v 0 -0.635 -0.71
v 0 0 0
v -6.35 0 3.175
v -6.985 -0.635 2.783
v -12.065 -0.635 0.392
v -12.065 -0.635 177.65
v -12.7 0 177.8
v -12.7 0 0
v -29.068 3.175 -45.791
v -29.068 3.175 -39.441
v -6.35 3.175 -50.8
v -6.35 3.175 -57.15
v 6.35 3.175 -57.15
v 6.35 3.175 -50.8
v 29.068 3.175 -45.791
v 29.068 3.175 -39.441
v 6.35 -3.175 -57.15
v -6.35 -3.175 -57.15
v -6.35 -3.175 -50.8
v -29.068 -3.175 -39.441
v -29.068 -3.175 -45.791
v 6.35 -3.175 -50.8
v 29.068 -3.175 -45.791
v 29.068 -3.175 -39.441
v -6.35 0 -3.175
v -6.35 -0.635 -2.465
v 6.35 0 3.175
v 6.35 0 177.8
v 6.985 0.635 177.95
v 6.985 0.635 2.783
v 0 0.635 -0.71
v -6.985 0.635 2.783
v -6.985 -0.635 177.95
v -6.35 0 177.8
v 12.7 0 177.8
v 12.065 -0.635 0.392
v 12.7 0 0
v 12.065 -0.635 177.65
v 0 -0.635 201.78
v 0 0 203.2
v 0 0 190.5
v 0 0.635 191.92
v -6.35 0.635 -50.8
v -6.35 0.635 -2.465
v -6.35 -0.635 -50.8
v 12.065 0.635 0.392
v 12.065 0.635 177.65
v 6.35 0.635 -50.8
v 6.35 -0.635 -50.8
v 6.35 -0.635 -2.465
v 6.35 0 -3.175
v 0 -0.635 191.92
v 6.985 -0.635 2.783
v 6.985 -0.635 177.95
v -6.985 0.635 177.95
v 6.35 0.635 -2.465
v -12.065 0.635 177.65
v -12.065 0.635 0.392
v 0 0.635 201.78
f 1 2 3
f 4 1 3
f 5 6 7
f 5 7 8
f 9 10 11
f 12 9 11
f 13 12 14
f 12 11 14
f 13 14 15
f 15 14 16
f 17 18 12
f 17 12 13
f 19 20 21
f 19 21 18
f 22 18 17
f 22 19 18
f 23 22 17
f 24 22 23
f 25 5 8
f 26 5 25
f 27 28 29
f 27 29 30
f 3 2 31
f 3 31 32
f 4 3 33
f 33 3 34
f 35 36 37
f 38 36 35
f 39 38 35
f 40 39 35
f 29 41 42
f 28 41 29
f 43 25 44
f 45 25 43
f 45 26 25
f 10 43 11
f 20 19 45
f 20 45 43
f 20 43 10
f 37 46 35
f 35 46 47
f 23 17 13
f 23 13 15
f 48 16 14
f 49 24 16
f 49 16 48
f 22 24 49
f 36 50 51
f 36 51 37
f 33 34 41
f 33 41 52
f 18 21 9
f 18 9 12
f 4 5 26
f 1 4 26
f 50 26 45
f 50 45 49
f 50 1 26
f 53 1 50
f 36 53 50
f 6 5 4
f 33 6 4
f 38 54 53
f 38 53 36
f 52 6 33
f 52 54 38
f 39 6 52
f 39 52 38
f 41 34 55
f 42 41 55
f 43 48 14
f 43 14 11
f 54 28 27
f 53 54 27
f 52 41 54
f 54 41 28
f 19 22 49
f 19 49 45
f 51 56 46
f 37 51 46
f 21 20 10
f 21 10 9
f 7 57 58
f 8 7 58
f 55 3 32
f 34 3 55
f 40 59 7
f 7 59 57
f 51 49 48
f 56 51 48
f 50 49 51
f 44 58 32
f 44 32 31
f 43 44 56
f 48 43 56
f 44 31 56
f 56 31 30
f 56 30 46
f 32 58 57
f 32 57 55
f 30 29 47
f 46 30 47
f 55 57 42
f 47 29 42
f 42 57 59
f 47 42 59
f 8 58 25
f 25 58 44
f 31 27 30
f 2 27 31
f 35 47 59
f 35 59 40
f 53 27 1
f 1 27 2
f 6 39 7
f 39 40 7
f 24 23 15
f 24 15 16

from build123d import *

# Parameters (mm, degrees)
F1_DEPTH = 0.635
F2_SIZE  = 0.63499
F3_DEPTH = 3.175
F4_SIZE  = 0.63499


# Not quite as in the source:
# - a fillet or chamfer is up to 0.001 mm smaller than in the source, because OpenCascade refuses the exact size


with BuildPart() as f1:
    # F0 (on Front) → F1 (new body, symmetric)
    with BuildSketch(Plane.XZ):
        Polygon((12.7, 177.8), (0, 203.2), (-12.7, 177.8), (-12.7, 0), (-6.35, -3.175), (-6.35, -50.8), (0, -50.8), (6.35, -50.8), (6.35, -3.175), (12.7, 0), align=None)
        Polygon((-6.35, 177.8), (0, 190.5), (6.35, 177.8), (6.35, 3.175), (0, 0), (-6.35, 3.175), align=None, mode=Mode.SUBTRACT)
    extrude(amount=F1_DEPTH, both=True)

    # F2 (size 0.635 in the source; OpenCascade refuses exactly that, so slightly less here)
    f2_edges = [f1.edges().sort_by_distance(p)[0] for p in [
        (12.7, -0.635, 88.9),
        (6.35, -0.635, 190.5),
        (-6.35, -0.635, 190.5),
        (-12.7, -0.635, 88.9),
        (-9.525, -0.635, -1.5875),
        (9.525, -0.635, -1.5875),
        (-9.525, 0.635, -1.5875),
        (9.525, 0.635, -1.5875),
        (-12.7, 0.635, 88.9),
        (12.7, 0.635, 88.9),
        (-6.35, 0.635, 190.5),
        (6.35, 0.635, 190.5),
    ]]
    chamfer(f2_edges, length=F2_SIZE)

    # F0 (on Front) → F3 (join, symmetric)
    with BuildSketch(Plane.XZ):
        Polygon((0, -50.8), (-6.35, -50.8), (-29.0684506514, -39.4407746743), (-29.0684506514, -45.7907746743), (-6.35, -57.15), (-3.175, -57.15), (0, -57.15), (3.175, -57.15), (6.35, -57.15), (29.0684506514, -45.7907746743), (29.0684506514, -39.4407746743), (6.35, -50.8), align=None)
    extrude(amount=F3_DEPTH, both=True)

    # F4 (size 0.635 in the source; OpenCascade refuses exactly that, so slightly less here)
    f4_edges = [f1.edges().sort_by_distance(p)[0] for p in [
        (6.35, -0.635, 90.4875),
        (-6.35, -0.635, 90.4875),
        (3.175, -0.635, 1.5875),
        (-3.175, -0.635, 1.5875),
        (-3.175, -0.635, 184.15),
        (3.175, -0.635, 184.15),
        (3.175, 0.635, 184.15),
        (-3.175, 0.635, 184.15),
        (-6.35, 0.635, 90.4875),
        (6.35, 0.635, 90.4875),
        (-3.175, 0.635, 1.5875),
        (3.175, 0.635, 1.5875),
    ]]
    chamfer(f4_edges, length=F4_SIZE)


solid = f1.part
